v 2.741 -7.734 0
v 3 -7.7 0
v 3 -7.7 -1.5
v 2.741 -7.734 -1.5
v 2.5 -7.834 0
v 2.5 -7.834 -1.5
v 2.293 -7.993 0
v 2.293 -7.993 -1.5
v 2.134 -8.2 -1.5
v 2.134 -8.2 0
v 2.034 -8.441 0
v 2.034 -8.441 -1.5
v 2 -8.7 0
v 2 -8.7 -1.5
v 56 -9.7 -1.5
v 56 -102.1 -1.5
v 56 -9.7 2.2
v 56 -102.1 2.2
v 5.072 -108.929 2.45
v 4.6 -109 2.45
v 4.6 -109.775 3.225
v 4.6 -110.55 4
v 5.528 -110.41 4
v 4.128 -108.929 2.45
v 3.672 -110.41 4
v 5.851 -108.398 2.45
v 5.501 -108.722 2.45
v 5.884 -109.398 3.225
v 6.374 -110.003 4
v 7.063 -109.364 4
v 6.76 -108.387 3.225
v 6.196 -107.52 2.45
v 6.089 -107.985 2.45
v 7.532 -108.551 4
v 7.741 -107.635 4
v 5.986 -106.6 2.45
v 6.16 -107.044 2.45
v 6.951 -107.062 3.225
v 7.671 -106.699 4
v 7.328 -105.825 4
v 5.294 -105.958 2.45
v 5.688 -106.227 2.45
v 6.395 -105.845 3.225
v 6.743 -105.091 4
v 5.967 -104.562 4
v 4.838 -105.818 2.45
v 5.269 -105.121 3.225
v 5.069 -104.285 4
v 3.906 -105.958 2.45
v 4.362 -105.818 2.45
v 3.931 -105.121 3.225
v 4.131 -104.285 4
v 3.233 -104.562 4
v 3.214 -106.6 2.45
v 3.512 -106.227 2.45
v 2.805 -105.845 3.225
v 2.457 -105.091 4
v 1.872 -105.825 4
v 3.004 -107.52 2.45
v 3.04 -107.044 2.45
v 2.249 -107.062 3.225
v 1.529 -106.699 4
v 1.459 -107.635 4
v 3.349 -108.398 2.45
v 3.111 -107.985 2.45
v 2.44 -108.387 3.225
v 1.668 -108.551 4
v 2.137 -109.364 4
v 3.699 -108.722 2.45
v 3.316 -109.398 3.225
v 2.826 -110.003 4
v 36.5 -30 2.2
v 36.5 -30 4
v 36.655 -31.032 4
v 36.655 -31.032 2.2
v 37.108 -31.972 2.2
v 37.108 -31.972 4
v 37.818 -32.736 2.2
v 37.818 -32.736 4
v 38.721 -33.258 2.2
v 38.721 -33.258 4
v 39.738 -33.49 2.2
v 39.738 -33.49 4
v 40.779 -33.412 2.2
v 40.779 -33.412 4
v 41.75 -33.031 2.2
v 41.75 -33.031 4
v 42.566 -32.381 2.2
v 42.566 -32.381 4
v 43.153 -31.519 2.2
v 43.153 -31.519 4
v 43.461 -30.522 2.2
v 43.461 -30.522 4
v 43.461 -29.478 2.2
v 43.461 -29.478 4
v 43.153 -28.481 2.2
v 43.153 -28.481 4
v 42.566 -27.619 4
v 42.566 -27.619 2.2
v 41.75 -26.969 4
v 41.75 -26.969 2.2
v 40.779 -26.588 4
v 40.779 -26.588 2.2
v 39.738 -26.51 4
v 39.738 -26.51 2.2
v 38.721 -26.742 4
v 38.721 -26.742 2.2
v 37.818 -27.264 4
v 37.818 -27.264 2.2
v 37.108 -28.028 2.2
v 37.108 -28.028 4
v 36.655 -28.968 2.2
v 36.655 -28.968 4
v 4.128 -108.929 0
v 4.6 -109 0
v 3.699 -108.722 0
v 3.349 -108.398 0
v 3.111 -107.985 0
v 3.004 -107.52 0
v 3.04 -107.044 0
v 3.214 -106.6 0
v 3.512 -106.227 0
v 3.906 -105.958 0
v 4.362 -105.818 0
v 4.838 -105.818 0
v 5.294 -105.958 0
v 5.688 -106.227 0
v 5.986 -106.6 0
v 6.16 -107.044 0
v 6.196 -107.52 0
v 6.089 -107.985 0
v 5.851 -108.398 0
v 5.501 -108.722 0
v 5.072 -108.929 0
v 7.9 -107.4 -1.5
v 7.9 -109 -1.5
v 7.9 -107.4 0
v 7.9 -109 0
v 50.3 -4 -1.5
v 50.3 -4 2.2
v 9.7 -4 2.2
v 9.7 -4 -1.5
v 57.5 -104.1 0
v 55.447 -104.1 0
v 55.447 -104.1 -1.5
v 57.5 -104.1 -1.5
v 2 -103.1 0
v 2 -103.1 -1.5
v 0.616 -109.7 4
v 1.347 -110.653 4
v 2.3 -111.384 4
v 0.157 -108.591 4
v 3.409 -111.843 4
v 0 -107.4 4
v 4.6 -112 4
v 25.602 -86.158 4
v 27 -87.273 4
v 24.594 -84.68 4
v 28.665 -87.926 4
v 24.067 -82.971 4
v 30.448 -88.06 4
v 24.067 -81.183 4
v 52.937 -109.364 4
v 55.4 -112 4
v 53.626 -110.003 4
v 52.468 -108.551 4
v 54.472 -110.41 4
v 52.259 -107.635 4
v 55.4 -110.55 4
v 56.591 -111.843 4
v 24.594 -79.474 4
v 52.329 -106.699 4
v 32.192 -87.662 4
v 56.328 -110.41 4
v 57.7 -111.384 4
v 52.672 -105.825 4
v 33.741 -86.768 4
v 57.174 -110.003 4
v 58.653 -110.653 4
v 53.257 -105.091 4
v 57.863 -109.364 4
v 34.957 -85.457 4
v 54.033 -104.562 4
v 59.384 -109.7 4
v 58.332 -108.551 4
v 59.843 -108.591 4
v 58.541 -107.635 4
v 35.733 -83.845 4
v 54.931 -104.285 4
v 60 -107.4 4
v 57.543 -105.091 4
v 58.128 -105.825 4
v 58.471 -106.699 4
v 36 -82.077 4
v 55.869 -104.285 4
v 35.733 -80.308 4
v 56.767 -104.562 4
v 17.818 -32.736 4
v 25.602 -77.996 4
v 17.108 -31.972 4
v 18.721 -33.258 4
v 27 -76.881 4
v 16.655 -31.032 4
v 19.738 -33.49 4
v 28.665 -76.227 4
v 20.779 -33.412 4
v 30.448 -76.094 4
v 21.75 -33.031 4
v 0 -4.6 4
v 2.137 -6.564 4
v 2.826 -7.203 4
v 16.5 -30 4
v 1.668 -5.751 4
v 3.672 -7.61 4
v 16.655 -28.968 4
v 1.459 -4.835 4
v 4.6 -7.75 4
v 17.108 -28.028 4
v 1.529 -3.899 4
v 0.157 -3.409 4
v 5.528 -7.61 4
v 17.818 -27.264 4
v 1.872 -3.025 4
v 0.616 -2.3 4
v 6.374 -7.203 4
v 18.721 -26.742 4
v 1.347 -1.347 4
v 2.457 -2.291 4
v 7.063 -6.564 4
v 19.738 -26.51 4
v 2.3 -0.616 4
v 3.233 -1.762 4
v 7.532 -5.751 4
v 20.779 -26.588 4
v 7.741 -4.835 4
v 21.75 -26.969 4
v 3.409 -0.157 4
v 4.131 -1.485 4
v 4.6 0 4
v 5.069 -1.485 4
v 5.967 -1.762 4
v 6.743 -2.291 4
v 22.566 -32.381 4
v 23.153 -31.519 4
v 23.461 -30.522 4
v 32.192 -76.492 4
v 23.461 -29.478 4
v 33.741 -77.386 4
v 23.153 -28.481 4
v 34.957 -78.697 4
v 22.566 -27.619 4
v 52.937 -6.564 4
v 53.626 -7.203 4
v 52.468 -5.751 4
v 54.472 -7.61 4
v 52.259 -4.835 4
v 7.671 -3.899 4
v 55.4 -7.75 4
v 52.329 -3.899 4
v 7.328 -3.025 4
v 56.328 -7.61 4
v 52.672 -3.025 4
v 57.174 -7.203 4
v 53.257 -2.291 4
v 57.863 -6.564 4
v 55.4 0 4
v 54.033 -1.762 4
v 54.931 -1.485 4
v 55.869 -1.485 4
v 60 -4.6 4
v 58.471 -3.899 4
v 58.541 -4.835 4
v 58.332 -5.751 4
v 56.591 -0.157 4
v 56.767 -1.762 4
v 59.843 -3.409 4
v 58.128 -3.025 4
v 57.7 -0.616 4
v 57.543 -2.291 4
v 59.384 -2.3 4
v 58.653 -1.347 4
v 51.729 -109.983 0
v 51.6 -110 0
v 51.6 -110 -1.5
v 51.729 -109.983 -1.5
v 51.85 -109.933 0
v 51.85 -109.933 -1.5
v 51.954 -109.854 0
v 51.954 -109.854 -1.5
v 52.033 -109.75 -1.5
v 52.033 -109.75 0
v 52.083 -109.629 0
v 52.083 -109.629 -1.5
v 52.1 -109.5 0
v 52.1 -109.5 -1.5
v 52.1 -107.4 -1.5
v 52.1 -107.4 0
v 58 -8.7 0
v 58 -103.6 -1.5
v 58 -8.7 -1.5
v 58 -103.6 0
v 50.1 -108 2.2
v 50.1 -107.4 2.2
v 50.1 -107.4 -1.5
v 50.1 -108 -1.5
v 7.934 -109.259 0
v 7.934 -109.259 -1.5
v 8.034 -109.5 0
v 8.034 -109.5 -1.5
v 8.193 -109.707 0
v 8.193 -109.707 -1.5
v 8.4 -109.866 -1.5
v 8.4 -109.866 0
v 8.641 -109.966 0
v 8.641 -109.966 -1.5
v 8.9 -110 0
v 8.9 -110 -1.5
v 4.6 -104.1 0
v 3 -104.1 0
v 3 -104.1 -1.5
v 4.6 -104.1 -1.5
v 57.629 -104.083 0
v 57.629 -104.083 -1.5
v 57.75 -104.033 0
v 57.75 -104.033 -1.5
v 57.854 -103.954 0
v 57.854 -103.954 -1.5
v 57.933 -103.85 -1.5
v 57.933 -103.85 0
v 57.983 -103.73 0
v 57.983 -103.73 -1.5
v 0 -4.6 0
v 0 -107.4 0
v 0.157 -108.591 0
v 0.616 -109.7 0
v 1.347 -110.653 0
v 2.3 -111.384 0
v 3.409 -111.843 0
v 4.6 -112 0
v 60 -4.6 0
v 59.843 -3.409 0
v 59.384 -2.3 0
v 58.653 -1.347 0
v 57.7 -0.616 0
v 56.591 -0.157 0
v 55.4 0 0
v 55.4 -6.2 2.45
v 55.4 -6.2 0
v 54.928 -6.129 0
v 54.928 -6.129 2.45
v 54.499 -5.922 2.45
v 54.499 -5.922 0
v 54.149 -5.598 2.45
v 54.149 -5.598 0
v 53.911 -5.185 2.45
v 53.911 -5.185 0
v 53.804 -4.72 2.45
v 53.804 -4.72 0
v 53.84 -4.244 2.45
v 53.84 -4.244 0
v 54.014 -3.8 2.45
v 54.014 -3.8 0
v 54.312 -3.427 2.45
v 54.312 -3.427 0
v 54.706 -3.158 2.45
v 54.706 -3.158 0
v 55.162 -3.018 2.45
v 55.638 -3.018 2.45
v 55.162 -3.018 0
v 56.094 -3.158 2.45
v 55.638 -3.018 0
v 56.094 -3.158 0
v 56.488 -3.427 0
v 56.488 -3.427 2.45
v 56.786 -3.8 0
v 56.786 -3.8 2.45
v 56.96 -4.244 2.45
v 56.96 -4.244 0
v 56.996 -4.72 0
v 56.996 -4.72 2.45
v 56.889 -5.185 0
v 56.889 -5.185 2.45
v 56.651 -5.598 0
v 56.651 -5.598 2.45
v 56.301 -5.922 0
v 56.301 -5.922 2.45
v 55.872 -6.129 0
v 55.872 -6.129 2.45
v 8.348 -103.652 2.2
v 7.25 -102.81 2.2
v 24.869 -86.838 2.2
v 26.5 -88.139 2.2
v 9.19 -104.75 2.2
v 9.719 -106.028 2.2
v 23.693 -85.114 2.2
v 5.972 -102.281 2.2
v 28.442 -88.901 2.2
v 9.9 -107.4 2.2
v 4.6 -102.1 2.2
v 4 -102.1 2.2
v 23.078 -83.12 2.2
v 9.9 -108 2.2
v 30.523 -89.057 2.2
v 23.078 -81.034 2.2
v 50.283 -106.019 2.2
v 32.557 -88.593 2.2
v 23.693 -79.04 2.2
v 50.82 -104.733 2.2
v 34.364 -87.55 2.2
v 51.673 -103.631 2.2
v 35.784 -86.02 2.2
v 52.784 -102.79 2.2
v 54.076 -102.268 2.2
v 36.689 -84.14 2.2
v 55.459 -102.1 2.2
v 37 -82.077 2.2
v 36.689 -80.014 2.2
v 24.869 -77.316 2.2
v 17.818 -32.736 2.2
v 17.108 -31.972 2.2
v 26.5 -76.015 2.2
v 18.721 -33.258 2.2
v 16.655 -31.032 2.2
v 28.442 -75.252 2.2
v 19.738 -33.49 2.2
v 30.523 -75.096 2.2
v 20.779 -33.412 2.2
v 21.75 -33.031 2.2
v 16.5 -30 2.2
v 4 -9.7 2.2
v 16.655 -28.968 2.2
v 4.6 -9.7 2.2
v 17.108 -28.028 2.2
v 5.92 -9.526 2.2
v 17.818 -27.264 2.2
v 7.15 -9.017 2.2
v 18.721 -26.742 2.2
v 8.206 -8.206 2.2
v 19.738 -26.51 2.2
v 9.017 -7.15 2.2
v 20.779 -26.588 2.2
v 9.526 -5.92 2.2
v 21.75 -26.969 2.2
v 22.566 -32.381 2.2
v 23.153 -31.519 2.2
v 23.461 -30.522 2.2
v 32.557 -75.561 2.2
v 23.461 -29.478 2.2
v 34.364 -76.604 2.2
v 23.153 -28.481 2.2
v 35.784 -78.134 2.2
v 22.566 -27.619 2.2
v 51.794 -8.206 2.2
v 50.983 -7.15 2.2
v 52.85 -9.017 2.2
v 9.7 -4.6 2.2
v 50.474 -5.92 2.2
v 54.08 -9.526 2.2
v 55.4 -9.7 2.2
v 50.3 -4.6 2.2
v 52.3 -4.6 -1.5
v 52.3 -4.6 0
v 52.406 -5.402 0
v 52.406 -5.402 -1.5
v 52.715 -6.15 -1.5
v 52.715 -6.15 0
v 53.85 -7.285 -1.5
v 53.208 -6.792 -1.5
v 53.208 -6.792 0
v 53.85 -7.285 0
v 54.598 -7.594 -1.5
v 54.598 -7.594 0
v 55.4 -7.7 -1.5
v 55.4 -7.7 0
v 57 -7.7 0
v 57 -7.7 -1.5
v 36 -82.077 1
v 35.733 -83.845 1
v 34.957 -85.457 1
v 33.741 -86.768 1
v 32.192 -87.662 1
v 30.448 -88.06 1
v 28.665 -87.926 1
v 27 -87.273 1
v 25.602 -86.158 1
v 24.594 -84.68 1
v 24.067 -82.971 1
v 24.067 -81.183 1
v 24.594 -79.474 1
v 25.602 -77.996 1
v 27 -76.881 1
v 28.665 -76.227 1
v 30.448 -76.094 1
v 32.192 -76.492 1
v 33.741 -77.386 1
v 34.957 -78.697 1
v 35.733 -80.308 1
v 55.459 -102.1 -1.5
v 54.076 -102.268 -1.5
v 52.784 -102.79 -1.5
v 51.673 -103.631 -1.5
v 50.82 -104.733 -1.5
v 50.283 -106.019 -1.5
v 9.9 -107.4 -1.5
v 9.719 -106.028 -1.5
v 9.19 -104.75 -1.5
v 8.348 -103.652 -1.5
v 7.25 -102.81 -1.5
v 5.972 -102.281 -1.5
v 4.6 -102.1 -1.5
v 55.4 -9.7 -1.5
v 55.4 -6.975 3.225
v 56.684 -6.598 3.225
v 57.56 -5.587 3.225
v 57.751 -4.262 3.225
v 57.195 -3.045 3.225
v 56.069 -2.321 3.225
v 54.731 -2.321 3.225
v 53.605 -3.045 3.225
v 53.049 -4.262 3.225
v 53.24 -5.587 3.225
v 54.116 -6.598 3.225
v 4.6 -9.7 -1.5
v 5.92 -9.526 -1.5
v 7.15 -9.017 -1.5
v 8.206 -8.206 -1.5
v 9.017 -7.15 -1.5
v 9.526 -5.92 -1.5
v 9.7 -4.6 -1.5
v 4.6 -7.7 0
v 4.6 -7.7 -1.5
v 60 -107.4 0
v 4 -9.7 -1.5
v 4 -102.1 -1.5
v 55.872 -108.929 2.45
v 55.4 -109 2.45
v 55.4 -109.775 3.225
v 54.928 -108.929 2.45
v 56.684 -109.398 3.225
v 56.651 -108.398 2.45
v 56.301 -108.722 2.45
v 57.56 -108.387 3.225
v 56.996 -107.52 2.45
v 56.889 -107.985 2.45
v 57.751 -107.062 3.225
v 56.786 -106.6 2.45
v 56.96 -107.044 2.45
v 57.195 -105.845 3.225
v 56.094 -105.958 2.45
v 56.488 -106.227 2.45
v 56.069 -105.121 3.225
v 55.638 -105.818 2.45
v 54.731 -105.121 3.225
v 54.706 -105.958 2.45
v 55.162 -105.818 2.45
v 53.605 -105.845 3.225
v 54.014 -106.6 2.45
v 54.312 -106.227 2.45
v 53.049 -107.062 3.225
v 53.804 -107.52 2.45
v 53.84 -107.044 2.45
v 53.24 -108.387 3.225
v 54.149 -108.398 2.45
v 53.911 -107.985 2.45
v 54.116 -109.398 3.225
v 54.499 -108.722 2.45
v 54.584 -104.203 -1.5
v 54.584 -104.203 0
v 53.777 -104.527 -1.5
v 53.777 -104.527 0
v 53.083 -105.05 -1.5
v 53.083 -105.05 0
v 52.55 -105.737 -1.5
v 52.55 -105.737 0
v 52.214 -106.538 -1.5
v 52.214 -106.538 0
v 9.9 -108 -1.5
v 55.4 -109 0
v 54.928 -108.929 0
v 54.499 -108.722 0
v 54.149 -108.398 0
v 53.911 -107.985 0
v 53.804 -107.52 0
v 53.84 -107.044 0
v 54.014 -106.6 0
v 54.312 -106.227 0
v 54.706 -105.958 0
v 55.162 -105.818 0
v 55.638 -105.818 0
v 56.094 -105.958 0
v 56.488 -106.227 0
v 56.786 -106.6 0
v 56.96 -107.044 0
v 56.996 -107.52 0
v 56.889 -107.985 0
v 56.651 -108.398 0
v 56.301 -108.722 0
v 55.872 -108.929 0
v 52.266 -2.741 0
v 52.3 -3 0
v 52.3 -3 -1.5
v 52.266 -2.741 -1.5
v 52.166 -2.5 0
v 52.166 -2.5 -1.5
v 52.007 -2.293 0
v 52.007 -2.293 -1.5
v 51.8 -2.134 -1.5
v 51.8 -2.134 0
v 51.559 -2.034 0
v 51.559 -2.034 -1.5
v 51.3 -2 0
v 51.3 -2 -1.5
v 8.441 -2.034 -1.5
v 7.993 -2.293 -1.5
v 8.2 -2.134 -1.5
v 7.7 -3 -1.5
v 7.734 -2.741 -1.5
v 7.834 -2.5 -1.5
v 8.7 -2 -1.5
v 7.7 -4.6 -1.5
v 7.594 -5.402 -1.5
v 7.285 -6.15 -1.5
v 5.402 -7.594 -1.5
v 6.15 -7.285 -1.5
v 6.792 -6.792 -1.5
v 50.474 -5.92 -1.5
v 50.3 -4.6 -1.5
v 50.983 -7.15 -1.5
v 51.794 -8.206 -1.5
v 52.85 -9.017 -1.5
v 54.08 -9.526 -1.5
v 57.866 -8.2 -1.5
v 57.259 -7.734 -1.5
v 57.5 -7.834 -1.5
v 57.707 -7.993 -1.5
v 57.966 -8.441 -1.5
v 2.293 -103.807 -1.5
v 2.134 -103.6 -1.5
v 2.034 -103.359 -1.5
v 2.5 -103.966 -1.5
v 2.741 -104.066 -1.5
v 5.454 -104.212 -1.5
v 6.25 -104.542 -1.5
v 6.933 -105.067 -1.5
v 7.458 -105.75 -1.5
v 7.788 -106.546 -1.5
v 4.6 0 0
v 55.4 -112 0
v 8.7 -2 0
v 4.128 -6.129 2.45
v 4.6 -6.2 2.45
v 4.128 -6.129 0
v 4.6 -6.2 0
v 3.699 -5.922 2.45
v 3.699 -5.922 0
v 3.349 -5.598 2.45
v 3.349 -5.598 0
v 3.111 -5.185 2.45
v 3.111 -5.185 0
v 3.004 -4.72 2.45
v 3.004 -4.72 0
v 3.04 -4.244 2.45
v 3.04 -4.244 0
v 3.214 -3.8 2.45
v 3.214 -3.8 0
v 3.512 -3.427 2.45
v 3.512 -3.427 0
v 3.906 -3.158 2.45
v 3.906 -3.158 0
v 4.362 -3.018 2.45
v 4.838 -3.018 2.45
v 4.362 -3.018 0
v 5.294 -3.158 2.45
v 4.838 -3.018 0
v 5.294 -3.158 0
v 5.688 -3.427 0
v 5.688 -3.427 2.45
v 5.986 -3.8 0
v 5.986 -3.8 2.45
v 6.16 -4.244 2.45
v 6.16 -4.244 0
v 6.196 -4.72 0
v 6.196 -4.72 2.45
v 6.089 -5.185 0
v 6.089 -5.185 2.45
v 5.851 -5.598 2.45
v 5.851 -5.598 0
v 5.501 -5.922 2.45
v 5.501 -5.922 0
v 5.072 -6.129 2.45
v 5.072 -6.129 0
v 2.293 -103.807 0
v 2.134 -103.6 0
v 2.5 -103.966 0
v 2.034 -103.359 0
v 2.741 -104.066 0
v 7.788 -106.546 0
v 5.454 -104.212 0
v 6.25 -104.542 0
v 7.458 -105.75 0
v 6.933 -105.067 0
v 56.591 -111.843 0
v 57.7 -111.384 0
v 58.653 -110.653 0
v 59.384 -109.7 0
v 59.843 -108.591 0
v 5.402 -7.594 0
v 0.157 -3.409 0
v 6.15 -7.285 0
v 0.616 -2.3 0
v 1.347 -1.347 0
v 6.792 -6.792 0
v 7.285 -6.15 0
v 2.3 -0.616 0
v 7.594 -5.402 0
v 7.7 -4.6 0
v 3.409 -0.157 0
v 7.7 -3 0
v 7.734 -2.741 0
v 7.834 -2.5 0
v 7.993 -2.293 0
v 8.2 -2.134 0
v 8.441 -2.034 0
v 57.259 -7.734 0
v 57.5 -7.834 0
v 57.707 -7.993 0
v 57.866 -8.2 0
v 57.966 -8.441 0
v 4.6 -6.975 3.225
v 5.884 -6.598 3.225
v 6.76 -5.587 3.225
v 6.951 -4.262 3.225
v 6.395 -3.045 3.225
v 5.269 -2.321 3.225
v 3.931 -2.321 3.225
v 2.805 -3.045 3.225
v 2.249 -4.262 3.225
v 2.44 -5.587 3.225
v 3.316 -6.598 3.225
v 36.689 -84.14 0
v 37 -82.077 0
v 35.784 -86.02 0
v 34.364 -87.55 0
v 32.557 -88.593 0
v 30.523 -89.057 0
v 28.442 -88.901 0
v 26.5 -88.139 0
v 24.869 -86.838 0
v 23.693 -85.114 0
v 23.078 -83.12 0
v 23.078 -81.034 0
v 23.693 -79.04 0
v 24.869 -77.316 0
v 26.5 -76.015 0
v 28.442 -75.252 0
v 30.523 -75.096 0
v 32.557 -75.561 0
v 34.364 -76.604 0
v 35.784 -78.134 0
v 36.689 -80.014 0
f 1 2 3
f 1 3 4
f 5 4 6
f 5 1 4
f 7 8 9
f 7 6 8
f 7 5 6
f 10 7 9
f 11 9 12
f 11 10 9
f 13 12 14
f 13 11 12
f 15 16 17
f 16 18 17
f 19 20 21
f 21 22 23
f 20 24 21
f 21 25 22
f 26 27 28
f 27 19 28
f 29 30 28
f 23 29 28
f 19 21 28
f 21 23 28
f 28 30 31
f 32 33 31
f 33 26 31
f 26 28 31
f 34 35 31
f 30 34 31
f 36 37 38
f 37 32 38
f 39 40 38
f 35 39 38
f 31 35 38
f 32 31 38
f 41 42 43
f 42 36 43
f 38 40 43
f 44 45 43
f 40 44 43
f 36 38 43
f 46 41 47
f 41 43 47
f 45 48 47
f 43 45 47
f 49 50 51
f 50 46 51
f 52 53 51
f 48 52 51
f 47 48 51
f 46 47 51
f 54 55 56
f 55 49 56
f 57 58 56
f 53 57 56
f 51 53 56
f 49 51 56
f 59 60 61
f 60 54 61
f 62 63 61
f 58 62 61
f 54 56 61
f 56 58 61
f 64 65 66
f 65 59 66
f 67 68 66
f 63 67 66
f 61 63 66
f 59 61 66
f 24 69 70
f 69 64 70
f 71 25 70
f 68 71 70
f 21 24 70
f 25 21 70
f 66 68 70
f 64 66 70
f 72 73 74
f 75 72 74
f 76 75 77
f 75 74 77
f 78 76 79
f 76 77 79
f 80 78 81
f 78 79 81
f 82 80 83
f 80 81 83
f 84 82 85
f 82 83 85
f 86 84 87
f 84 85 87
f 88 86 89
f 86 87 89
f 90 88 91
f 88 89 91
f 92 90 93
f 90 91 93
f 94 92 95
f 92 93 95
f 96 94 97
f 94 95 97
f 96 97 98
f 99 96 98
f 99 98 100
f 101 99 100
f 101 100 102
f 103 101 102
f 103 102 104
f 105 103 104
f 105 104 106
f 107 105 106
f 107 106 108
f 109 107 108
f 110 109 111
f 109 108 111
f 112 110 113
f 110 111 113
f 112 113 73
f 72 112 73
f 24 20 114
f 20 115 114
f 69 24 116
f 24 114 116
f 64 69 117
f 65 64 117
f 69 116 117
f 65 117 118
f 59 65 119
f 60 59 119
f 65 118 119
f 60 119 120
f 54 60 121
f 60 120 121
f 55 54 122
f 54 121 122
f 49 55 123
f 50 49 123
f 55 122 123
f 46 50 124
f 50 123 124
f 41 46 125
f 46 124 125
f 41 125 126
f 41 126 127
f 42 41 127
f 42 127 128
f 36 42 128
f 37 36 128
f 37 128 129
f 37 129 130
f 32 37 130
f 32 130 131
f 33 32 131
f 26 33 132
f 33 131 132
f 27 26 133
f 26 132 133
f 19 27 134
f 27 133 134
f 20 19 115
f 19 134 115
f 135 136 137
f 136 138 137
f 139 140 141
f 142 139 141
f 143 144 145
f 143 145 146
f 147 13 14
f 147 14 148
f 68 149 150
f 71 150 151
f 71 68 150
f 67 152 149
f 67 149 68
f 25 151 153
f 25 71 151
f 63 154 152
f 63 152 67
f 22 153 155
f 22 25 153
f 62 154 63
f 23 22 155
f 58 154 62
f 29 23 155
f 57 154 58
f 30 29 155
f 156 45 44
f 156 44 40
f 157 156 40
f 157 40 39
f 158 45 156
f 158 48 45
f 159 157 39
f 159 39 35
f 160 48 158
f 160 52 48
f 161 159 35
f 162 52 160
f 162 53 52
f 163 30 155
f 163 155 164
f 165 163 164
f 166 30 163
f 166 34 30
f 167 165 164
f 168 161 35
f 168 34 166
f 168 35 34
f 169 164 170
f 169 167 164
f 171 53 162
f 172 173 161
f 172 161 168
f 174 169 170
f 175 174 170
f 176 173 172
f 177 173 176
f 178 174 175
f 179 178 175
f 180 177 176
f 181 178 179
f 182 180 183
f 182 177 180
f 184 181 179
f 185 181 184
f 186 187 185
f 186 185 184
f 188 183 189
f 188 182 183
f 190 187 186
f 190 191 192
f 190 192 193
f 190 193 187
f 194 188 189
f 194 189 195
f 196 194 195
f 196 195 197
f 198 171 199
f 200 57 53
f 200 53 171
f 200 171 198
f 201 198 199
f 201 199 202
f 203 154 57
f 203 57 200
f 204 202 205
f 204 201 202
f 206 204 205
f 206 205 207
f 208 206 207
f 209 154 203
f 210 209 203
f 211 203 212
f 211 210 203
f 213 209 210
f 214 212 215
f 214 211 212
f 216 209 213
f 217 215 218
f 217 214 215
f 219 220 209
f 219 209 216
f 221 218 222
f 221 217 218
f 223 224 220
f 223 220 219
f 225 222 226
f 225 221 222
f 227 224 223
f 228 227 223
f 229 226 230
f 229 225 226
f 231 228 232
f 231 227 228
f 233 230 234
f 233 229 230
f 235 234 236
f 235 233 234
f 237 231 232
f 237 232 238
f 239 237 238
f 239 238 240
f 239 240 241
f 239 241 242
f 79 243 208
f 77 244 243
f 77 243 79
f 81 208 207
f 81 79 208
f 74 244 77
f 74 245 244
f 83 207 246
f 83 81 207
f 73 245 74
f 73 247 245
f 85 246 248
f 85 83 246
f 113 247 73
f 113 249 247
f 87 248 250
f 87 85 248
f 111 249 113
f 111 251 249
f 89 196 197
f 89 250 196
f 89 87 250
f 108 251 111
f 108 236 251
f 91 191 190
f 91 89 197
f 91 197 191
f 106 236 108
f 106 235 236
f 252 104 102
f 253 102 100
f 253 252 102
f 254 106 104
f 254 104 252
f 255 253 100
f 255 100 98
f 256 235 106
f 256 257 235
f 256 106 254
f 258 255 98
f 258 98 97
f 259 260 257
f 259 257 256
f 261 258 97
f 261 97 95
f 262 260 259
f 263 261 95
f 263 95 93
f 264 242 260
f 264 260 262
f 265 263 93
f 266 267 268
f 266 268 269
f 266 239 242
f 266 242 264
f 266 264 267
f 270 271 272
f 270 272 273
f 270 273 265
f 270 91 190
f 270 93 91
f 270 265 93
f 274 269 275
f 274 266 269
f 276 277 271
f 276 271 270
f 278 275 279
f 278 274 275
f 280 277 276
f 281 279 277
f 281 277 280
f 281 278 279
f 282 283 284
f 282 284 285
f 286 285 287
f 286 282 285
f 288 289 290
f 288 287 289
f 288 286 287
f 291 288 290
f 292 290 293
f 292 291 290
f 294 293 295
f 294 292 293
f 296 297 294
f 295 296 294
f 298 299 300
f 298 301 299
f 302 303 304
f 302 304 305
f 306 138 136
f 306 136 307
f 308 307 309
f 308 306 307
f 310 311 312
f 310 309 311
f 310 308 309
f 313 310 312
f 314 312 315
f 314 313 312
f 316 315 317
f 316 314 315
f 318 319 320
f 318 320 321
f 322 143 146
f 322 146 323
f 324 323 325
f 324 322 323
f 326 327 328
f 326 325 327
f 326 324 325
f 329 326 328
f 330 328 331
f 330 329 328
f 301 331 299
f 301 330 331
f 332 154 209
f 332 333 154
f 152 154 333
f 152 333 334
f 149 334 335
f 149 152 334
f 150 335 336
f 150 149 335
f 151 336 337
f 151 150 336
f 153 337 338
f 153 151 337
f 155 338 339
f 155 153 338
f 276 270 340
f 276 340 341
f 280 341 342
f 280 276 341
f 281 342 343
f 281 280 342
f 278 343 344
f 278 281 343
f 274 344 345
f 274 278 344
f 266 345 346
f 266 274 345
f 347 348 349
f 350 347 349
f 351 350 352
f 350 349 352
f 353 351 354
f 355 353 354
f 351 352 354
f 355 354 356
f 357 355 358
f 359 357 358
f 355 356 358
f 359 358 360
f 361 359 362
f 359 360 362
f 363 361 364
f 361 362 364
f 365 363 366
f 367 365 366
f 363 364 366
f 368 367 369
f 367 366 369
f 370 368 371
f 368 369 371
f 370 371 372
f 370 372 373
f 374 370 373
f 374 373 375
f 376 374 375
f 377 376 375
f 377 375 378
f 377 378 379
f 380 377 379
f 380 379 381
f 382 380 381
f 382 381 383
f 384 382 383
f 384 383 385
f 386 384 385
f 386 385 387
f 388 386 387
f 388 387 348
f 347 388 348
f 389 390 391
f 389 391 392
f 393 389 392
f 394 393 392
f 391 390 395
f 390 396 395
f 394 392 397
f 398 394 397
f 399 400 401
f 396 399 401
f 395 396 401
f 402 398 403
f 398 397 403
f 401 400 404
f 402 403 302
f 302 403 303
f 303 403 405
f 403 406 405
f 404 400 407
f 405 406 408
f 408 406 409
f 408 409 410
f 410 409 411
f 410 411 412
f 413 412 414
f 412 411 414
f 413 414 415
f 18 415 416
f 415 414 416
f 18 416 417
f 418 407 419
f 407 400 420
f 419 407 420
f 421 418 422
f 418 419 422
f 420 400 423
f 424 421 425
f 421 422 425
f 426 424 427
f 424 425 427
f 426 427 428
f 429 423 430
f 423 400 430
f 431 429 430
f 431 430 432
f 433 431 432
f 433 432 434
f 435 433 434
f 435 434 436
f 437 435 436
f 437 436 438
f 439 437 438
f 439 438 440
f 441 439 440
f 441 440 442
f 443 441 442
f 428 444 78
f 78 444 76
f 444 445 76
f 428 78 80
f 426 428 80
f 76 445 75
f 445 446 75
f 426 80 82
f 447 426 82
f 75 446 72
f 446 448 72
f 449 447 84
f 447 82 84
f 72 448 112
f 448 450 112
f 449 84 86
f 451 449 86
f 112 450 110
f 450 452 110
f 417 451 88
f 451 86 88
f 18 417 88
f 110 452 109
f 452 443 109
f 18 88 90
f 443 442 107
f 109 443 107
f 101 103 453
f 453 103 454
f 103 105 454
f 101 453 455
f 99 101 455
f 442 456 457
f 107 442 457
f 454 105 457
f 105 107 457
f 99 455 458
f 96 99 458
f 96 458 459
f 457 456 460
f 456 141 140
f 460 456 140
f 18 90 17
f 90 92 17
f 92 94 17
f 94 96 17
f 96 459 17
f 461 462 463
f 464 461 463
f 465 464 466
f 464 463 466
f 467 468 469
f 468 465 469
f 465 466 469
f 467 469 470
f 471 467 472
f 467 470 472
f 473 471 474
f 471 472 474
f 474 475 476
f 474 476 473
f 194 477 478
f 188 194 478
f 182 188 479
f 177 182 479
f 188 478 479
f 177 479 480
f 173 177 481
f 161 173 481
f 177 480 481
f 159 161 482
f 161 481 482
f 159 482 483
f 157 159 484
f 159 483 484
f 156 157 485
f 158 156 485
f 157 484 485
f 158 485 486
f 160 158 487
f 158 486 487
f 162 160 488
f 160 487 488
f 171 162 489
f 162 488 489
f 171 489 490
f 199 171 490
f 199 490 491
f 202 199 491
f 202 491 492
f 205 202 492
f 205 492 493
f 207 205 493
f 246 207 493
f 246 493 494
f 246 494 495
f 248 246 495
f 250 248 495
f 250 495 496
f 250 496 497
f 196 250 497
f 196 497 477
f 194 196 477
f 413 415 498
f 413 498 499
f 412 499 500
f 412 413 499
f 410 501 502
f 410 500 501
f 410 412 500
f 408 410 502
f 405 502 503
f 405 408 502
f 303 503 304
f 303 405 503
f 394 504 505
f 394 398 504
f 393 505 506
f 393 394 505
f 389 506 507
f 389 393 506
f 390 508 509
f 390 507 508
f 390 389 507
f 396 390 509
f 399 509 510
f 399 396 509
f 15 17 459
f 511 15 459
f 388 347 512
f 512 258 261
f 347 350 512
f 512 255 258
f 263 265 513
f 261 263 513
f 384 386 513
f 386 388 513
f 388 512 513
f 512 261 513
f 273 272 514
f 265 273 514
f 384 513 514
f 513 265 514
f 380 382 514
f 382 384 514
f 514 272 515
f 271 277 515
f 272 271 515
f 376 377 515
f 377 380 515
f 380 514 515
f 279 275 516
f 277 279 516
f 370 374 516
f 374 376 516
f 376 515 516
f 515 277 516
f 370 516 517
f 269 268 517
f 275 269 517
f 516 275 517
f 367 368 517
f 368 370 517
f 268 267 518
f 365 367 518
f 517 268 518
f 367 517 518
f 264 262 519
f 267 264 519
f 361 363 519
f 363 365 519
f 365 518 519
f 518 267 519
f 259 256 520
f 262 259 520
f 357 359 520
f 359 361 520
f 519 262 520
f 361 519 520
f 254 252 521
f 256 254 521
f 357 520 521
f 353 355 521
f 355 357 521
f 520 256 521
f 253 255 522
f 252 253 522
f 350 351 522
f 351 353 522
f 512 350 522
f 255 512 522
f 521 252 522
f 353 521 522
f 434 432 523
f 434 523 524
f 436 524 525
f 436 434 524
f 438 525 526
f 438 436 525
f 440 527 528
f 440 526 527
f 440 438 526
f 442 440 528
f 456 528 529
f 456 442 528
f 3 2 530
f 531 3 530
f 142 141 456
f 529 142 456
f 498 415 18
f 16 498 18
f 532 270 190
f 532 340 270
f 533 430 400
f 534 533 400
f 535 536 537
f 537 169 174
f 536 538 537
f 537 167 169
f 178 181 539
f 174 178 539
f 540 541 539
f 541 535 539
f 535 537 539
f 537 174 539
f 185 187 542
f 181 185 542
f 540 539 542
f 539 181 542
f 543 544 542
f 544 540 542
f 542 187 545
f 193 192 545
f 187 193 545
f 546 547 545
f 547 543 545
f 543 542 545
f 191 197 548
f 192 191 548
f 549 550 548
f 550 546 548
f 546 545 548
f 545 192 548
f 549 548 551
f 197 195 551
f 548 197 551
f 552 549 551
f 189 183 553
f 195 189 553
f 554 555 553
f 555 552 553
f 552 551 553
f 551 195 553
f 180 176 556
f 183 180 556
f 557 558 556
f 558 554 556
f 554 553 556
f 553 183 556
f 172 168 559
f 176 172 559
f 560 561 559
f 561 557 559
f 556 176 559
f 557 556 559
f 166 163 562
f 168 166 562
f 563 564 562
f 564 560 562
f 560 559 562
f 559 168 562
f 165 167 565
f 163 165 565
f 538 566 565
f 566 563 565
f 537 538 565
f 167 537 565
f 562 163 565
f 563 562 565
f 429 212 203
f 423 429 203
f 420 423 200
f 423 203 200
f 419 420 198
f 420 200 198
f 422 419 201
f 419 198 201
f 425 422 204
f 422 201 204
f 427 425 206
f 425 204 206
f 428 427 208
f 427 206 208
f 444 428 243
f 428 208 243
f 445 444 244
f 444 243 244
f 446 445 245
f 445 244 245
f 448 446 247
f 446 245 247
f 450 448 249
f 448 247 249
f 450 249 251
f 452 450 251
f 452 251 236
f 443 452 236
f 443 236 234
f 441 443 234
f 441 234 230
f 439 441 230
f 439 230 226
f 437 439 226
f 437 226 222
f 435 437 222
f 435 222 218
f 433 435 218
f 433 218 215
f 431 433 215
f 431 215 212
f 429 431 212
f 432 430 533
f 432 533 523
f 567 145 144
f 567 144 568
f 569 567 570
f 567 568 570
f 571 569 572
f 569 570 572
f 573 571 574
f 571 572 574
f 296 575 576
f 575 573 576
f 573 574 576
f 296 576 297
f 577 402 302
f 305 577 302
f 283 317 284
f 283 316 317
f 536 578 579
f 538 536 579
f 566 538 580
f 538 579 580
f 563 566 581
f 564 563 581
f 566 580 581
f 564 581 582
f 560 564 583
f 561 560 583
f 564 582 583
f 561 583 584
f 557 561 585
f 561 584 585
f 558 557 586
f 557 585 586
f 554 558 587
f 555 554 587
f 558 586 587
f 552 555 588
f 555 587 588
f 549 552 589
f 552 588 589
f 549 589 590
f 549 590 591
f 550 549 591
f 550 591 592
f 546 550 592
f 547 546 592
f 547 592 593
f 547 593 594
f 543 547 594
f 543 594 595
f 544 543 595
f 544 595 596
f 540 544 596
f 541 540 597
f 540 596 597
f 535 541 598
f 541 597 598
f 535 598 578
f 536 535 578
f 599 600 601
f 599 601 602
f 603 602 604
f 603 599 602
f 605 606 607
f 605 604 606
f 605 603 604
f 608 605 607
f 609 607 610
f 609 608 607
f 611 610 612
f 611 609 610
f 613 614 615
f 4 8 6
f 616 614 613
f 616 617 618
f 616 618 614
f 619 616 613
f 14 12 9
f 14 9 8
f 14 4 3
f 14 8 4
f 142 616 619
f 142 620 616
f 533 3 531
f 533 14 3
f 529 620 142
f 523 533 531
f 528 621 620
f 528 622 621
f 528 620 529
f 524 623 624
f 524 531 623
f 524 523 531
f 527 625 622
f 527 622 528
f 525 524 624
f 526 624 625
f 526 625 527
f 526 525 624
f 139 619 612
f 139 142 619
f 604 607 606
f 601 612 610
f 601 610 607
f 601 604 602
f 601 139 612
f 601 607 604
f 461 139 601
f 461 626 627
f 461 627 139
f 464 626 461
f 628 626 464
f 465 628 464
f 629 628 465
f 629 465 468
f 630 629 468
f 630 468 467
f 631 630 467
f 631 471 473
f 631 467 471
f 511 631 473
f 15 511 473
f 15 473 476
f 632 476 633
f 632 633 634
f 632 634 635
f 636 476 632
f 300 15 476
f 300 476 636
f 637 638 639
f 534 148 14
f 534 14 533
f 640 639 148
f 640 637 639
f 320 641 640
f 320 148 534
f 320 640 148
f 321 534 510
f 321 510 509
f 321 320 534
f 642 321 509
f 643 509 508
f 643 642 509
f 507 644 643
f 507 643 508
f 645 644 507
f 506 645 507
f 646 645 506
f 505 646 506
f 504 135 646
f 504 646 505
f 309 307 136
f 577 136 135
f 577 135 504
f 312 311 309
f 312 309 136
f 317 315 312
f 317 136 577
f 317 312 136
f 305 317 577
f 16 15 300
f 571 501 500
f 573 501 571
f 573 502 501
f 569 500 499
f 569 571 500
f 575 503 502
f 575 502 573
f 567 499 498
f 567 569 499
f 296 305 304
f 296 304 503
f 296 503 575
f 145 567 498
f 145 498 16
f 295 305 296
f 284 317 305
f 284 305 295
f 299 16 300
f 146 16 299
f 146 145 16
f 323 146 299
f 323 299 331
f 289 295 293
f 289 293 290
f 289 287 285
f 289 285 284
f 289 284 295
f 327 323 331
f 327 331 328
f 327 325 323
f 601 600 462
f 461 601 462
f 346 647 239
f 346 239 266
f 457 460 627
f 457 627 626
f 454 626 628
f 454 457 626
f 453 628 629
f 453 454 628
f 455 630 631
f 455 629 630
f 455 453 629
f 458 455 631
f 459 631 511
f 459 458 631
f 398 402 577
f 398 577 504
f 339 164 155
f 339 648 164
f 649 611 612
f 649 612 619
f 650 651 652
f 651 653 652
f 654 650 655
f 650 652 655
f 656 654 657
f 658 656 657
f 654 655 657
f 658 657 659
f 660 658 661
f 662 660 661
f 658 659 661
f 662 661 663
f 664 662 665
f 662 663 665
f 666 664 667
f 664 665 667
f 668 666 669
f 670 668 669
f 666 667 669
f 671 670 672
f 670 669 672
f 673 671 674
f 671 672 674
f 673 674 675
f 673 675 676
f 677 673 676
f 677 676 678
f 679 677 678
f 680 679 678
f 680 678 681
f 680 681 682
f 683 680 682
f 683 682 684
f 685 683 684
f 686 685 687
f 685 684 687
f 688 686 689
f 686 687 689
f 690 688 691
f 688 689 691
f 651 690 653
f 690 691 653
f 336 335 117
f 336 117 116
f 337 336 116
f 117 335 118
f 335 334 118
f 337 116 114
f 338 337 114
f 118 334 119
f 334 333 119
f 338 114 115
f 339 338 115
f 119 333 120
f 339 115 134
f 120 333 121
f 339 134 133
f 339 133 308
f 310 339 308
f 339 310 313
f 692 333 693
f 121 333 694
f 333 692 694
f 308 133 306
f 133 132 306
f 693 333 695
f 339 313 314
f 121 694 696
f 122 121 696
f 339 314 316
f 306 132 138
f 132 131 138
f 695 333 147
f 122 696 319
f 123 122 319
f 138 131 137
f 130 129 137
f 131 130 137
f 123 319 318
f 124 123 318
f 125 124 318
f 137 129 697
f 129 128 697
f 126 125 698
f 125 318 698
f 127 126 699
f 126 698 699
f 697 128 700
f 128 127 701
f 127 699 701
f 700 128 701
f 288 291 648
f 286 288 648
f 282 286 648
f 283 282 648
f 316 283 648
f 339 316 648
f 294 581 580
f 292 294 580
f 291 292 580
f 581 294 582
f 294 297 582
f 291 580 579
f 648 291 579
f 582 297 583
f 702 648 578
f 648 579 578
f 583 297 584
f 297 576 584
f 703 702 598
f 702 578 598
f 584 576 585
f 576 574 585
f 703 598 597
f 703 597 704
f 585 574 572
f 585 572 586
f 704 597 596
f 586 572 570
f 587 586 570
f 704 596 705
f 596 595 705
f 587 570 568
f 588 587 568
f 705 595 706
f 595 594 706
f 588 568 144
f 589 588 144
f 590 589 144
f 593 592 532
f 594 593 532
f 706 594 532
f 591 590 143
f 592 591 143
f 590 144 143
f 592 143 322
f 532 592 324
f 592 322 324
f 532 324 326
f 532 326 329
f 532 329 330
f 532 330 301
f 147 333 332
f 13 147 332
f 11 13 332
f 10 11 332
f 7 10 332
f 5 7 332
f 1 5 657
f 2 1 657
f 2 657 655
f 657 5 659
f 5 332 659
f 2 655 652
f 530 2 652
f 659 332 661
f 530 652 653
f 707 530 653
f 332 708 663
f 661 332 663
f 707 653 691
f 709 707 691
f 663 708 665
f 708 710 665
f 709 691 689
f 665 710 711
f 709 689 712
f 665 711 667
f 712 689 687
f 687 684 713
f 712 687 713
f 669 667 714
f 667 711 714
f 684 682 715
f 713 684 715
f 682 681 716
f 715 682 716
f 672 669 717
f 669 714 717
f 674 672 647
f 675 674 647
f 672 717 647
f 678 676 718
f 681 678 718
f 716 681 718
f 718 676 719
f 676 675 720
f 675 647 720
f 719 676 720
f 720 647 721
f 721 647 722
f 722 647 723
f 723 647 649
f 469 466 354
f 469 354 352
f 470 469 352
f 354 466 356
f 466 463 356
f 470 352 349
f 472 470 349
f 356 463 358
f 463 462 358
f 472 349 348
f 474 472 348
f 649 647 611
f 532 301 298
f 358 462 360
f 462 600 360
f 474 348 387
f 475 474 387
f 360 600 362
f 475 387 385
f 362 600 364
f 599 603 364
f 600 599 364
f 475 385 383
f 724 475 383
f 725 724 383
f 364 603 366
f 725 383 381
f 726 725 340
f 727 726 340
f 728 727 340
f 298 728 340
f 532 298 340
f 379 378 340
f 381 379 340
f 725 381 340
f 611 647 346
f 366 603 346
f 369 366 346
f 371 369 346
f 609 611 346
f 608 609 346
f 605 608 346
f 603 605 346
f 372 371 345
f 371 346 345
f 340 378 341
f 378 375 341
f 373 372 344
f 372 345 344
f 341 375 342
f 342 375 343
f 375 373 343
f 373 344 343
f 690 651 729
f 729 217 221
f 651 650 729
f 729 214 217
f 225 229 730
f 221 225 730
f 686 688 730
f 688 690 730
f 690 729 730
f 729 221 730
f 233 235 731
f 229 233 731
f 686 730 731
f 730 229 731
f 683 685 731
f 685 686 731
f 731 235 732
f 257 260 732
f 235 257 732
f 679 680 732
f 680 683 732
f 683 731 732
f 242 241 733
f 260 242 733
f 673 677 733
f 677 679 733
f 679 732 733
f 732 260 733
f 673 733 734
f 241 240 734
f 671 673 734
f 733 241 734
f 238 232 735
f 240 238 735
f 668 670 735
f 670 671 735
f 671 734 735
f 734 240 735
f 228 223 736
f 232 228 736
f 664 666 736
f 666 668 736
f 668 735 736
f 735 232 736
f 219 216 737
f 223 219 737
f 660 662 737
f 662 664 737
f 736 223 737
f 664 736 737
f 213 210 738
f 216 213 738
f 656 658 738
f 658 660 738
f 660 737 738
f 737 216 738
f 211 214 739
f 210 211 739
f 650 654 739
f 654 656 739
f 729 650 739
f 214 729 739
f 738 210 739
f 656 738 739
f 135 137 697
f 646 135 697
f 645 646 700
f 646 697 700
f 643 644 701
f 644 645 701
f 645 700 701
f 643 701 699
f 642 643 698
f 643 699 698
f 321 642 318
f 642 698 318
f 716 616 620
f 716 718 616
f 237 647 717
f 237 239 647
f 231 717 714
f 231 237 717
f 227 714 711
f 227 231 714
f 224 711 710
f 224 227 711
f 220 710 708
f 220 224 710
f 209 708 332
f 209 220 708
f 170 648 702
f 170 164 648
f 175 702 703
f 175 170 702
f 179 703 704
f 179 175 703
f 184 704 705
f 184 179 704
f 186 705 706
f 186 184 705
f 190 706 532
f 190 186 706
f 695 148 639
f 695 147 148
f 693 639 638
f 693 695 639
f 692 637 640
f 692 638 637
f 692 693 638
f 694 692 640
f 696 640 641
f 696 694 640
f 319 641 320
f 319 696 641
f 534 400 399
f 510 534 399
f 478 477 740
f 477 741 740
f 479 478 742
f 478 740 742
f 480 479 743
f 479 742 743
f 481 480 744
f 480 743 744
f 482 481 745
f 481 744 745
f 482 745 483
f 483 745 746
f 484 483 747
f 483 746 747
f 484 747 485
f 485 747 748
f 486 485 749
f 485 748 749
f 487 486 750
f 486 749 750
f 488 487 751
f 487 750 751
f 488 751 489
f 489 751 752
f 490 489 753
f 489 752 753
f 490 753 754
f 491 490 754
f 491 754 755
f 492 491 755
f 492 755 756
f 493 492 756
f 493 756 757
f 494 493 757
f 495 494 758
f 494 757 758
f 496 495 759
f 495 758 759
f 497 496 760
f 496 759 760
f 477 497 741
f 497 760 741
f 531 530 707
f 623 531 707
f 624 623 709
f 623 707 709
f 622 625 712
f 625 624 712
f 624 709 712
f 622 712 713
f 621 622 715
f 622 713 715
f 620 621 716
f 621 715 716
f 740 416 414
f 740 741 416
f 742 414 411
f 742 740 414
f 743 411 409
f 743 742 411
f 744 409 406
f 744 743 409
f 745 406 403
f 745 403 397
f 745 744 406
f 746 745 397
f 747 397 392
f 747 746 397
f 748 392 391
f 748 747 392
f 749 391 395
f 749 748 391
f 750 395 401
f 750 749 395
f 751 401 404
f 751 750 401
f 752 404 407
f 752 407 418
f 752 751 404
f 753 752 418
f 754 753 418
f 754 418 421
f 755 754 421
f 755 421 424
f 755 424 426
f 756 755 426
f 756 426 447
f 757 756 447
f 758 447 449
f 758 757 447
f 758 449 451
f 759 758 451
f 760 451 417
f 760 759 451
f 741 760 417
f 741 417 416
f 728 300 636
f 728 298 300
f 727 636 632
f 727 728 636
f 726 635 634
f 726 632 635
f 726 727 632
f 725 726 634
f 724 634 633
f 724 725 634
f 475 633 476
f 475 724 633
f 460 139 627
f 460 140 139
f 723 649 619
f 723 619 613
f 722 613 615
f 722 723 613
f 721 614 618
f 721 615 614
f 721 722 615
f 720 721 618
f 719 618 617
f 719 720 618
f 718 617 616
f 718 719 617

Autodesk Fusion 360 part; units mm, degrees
sketch "Esquisse1" plane through (0, 0, 0) normal (0, 0, 1) x (1, 0, 0)
  line L0 (0, 0) -> (60, 0)
  line L1 (60, 0) -> (60, -112)
  line L2 (60, -112) -> (0, -112)
  line L3 (0, -112) -> (0, 0)
  dimension "d1" = 60
  dimension "d2" = 112
extrude "Extrusion1" add sketch "Esquisse1" along normal blind 4
sketch "Esquisse2" plane through (0, 0, 4) normal (0, 0, 1) x (-1, 0, 0)
  line L0 (0, 112) -> (-60, 112)
  line L1 (-60, 112) -> (-60, 0)
  line L2 (-60, 0) -> (0, 0)
  line L3 (0, 0) -> (0, 112)
  circle A0 centre (-4.6, 4.6) radius 1.6
  circle A1 centre (-4.6, 4.6) radius 1.6
  circle A2 centre (-55.4, 4.6) radius 1.6
  circle A3 centre (-4.6, 107.4) radius 1.6
  circle A4 centre (-55.4, 107.4) radius 1.6
  dimension "d5" = 3.2
  dimension "d6" = 4.6
  dimension "d7" = 4.6
  dimension "d8" = 3.2
  dimension "d9" = 3.2
  dimension "d10" = 4.6
  dimension "d11" = 4.6
  dimension "d12" = 3.2
  dimension "d13" = 4.6
  dimension "d14" = 4.6
  dimension "d15" = 3.2
  dimension "d16" = 4.6
  dimension "d17" = 4.6
hole "Perçage1" at (4.6, -4.6, 4) at (55.4, -4.6, 4) at (55.4, -107.4, 4) at (4.6, -107.4, 4) direction (0, 0, -1) diameter 3.2 depth 25 tip angle 118 countersink diameter 6.3 countersink angle 90
fillet "Congé1" radius 4.6 4 edges at (0, 0, 2) (60, 0, 2) (60, -112, 2) (0, -112, 2)
sketch "Esquisse3" plane through (0, 0, 0) normal (0, 0, -1) x (1, 0, 0)
  circle A0 centre (55.4, 107.4) radius 1.6
  circle A1 centre (4.6, 4.6) radius 1.6
  circle A2 centre (55.4, 4.6) radius 1.6
  circle A3 centre (4.6, 107.4) radius 1.6
  arc A4 (4.6, 112) -> (0, 107.4) centre (4.6, 107.4) ccw
  line L0 (0, 107.4) -> (0, 4.6)
  arc A5 (0, 4.6) -> (4.6, 0) centre (4.6, 4.6) ccw
  line L1 (4.6, 0) -> (55.4, 0)
  arc A6 (55.4, 0) -> (60, 4.6) centre (55.4, 4.6) ccw
  line L2 (60, 4.6) -> (60, 107.4)
  arc A7 (60, 107.4) -> (55.4, 112) centre (55.4, 107.4) ccw
  line L3 (55.4, 112) -> (4.6, 112)
  line L4 (8.9, 110) -> (51.6, 110)
  line L5 (2, 8.7) -> (2, 103.1)
  line L6 (52.1, 107.4) -> (52.1, 109.5)
  arc A8 (52.1, 107.4) -> (55.4467, 104.1003) centre (55.4, 107.4) ccw
  line L7 (55.3533, 104.1003) -> (57.5, 104.1003)
  arc A9 (52.1, 109.5) -> (51.6, 110) centre (51.6, 109.5) ccw
  arc A10 (58, 103.6003) -> (57.5, 104.1003) centre (57.5, 103.6003) ccw
  line L8 (7.9, 109) -> (7.9, 107.4)
  line L9 (3, 104.1) -> (4.6, 104.1)
  arc A11 (4.6, 104.1) -> (7.9, 107.4) centre (4.6, 107.4) ccw
  line L10 (3, 7.7) -> (4.6, 7.7)
  line L11 (7.7, 3) -> (7.7, 4.6)
  arc A12 (7.7, 4.6) -> (4.6, 7.7) centre (4.6, 4.6) ccw
  line L12 (57, 7.7) -> (55.4, 7.7)
  line L13 (52.3, 3) -> (52.3, 4.6)
  arc A13 (55.4, 7.7) -> (52.3, 4.6) centre (55.4, 4.6) ccw
  line L14 (58, 103.6003) -> (58, 8.7)
  line L15 (51.3, 2) -> (8.7, 2)
  arc A14 (8.9, 110) -> (7.9, 109) centre (8.9, 109) ccw
  arc A15 (3, 104.1) -> (2, 103.1) centre (3, 103.1) ccw
  arc A16 (2, 8.7) -> (3, 7.7) centre (3, 8.7) ccw
  arc A17 (7.7, 3) -> (8.7, 2) centre (8.7, 3) ccw
  arc A18 (51.3, 2) -> (52.3, 3) centre (51.3, 3) ccw
  arc A19 (57, 7.7) -> (58, 8.7) centre (57, 8.7) ccw
  line L16 (55.4592, 102.1003) -> (56, 102.1003)
  line L17 (56, 102.1003) -> (56, 9.7)
  line L18 (56, 9.7) -> (55.4, 9.7)
  arc A20 (55.4, 9.7) -> (50.3, 4.6) centre (55.4, 4.6) ccw
  line L19 (50.3, 4) -> (50.3, 4.6)
  line L20 (50.3, 4) -> (9.7, 4)
  line L21 (9.7, 4) -> (9.7, 4.6)
  arc A21 (9.7, 4.6) -> (4.6, 9.7) centre (4.6, 4.6) ccw
  line L22 (4, 9.7) -> (4.6, 9.7)
  line L23 (4, 9.7) -> (4, 102.1)
  line L24 (4, 102.1) -> (4.6, 102.1)
  arc A22 (4.6, 102.1) -> (9.9, 107.4) centre (4.6, 107.4) ccw
  line L25 (9.9, 108) -> (9.9, 107.4)
  line L26 (9.9, 108) -> (50.1, 108)
  line L27 (50.1, 107.4) -> (50.1, 108)
  arc A23 (50.1, 107.4) -> (55.4592, 102.1003) centre (55.4, 107.4) ccw
  dimension "d25" = 2
  dimension "d27" = 2
  dimension "d28" = 2
  dimension "d30" = 0.5
  dimension "d31" = 0.5
  dimension "d36" = 1
  dimension "d37" = 2
sketch "Esquisse5" plane through (0, 0, 0) normal (0, 0, -1) x (1, 0, 0)
  circle A0 centre (30, 82.0769) radius 6
  dimension "d42" = 12
extrude "Extrusion4" cut sketch "Esquisse5" against normal blind 9
chamfer "Chanfrein1" distance 1 angle 45 1 edges at (24.406, -84.2466, 0)
extrude "Extrusion2" add sketch "Esquisse3" along normal blind 1.5 contours L4 L5 L6 A8 L7 A9 A10 L8 L9 A11 L10 L11 A12 L12 L13 A13 L14 L15 A14 A15 A16 A17 A18 A19
extrude "Extrusion3" cut 1 faces at (29.8256, -30.6684, 0) along direction (0, 0, 1) blind 2.2
sketch "Esquisse6" plane through (0, 0, 4) normal (0, 0, 1) x (-1, 0, 0)
  circle A0 centre (-30, 82.0769) radius 6
  arc A1 (0, 107.4) -> (-4.6, 112) centre (-4.6, 107.4) ccw
  line L0 (-4.6, 112) -> (-55.4, 112)
  arc A2 (-55.4, 112) -> (-60, 107.4) centre (-55.4, 107.4) ccw
  line L1 (-60, 107.4) -> (-60, 4.6)
  arc A3 (-60, 4.6) -> (-55.4, 0) centre (-55.4, 4.6) ccw
  line L2 (-55.4, 0) -> (-4.6, 0)
  arc A4 (-4.6, 0) -> (0, 4.6) centre (-4.6, 4.6) ccw
  line L3 (0, 4.6) -> (0, 107.4)
  circle A5 centre (-55.4, 107.4) radius 3.15
  circle A6 centre (-4.6, 4.6) radius 3.15
  circle A7 centre (-55.4, 4.6) radius 3.15
  circle A8 centre (-4.6, 107.4) radius 3.15
  circle A9 centre (-20, 30) radius 3.5
  circle A10 centre (-40, 30) radius 3.5
  dimension "d52" = 7
  dimension "d53" = 30
  dimension "d54" = 7
  dimension "d55" = 30
  dimension "d56" = 20
  dimension "d57" = 20
extrude "Extrusion5" cut sketch "Esquisse6" against normal blind 20 contours A9 | A10
equation "d6 = 3 mm + ( 3.2 / 2 ) * 1 mm"
